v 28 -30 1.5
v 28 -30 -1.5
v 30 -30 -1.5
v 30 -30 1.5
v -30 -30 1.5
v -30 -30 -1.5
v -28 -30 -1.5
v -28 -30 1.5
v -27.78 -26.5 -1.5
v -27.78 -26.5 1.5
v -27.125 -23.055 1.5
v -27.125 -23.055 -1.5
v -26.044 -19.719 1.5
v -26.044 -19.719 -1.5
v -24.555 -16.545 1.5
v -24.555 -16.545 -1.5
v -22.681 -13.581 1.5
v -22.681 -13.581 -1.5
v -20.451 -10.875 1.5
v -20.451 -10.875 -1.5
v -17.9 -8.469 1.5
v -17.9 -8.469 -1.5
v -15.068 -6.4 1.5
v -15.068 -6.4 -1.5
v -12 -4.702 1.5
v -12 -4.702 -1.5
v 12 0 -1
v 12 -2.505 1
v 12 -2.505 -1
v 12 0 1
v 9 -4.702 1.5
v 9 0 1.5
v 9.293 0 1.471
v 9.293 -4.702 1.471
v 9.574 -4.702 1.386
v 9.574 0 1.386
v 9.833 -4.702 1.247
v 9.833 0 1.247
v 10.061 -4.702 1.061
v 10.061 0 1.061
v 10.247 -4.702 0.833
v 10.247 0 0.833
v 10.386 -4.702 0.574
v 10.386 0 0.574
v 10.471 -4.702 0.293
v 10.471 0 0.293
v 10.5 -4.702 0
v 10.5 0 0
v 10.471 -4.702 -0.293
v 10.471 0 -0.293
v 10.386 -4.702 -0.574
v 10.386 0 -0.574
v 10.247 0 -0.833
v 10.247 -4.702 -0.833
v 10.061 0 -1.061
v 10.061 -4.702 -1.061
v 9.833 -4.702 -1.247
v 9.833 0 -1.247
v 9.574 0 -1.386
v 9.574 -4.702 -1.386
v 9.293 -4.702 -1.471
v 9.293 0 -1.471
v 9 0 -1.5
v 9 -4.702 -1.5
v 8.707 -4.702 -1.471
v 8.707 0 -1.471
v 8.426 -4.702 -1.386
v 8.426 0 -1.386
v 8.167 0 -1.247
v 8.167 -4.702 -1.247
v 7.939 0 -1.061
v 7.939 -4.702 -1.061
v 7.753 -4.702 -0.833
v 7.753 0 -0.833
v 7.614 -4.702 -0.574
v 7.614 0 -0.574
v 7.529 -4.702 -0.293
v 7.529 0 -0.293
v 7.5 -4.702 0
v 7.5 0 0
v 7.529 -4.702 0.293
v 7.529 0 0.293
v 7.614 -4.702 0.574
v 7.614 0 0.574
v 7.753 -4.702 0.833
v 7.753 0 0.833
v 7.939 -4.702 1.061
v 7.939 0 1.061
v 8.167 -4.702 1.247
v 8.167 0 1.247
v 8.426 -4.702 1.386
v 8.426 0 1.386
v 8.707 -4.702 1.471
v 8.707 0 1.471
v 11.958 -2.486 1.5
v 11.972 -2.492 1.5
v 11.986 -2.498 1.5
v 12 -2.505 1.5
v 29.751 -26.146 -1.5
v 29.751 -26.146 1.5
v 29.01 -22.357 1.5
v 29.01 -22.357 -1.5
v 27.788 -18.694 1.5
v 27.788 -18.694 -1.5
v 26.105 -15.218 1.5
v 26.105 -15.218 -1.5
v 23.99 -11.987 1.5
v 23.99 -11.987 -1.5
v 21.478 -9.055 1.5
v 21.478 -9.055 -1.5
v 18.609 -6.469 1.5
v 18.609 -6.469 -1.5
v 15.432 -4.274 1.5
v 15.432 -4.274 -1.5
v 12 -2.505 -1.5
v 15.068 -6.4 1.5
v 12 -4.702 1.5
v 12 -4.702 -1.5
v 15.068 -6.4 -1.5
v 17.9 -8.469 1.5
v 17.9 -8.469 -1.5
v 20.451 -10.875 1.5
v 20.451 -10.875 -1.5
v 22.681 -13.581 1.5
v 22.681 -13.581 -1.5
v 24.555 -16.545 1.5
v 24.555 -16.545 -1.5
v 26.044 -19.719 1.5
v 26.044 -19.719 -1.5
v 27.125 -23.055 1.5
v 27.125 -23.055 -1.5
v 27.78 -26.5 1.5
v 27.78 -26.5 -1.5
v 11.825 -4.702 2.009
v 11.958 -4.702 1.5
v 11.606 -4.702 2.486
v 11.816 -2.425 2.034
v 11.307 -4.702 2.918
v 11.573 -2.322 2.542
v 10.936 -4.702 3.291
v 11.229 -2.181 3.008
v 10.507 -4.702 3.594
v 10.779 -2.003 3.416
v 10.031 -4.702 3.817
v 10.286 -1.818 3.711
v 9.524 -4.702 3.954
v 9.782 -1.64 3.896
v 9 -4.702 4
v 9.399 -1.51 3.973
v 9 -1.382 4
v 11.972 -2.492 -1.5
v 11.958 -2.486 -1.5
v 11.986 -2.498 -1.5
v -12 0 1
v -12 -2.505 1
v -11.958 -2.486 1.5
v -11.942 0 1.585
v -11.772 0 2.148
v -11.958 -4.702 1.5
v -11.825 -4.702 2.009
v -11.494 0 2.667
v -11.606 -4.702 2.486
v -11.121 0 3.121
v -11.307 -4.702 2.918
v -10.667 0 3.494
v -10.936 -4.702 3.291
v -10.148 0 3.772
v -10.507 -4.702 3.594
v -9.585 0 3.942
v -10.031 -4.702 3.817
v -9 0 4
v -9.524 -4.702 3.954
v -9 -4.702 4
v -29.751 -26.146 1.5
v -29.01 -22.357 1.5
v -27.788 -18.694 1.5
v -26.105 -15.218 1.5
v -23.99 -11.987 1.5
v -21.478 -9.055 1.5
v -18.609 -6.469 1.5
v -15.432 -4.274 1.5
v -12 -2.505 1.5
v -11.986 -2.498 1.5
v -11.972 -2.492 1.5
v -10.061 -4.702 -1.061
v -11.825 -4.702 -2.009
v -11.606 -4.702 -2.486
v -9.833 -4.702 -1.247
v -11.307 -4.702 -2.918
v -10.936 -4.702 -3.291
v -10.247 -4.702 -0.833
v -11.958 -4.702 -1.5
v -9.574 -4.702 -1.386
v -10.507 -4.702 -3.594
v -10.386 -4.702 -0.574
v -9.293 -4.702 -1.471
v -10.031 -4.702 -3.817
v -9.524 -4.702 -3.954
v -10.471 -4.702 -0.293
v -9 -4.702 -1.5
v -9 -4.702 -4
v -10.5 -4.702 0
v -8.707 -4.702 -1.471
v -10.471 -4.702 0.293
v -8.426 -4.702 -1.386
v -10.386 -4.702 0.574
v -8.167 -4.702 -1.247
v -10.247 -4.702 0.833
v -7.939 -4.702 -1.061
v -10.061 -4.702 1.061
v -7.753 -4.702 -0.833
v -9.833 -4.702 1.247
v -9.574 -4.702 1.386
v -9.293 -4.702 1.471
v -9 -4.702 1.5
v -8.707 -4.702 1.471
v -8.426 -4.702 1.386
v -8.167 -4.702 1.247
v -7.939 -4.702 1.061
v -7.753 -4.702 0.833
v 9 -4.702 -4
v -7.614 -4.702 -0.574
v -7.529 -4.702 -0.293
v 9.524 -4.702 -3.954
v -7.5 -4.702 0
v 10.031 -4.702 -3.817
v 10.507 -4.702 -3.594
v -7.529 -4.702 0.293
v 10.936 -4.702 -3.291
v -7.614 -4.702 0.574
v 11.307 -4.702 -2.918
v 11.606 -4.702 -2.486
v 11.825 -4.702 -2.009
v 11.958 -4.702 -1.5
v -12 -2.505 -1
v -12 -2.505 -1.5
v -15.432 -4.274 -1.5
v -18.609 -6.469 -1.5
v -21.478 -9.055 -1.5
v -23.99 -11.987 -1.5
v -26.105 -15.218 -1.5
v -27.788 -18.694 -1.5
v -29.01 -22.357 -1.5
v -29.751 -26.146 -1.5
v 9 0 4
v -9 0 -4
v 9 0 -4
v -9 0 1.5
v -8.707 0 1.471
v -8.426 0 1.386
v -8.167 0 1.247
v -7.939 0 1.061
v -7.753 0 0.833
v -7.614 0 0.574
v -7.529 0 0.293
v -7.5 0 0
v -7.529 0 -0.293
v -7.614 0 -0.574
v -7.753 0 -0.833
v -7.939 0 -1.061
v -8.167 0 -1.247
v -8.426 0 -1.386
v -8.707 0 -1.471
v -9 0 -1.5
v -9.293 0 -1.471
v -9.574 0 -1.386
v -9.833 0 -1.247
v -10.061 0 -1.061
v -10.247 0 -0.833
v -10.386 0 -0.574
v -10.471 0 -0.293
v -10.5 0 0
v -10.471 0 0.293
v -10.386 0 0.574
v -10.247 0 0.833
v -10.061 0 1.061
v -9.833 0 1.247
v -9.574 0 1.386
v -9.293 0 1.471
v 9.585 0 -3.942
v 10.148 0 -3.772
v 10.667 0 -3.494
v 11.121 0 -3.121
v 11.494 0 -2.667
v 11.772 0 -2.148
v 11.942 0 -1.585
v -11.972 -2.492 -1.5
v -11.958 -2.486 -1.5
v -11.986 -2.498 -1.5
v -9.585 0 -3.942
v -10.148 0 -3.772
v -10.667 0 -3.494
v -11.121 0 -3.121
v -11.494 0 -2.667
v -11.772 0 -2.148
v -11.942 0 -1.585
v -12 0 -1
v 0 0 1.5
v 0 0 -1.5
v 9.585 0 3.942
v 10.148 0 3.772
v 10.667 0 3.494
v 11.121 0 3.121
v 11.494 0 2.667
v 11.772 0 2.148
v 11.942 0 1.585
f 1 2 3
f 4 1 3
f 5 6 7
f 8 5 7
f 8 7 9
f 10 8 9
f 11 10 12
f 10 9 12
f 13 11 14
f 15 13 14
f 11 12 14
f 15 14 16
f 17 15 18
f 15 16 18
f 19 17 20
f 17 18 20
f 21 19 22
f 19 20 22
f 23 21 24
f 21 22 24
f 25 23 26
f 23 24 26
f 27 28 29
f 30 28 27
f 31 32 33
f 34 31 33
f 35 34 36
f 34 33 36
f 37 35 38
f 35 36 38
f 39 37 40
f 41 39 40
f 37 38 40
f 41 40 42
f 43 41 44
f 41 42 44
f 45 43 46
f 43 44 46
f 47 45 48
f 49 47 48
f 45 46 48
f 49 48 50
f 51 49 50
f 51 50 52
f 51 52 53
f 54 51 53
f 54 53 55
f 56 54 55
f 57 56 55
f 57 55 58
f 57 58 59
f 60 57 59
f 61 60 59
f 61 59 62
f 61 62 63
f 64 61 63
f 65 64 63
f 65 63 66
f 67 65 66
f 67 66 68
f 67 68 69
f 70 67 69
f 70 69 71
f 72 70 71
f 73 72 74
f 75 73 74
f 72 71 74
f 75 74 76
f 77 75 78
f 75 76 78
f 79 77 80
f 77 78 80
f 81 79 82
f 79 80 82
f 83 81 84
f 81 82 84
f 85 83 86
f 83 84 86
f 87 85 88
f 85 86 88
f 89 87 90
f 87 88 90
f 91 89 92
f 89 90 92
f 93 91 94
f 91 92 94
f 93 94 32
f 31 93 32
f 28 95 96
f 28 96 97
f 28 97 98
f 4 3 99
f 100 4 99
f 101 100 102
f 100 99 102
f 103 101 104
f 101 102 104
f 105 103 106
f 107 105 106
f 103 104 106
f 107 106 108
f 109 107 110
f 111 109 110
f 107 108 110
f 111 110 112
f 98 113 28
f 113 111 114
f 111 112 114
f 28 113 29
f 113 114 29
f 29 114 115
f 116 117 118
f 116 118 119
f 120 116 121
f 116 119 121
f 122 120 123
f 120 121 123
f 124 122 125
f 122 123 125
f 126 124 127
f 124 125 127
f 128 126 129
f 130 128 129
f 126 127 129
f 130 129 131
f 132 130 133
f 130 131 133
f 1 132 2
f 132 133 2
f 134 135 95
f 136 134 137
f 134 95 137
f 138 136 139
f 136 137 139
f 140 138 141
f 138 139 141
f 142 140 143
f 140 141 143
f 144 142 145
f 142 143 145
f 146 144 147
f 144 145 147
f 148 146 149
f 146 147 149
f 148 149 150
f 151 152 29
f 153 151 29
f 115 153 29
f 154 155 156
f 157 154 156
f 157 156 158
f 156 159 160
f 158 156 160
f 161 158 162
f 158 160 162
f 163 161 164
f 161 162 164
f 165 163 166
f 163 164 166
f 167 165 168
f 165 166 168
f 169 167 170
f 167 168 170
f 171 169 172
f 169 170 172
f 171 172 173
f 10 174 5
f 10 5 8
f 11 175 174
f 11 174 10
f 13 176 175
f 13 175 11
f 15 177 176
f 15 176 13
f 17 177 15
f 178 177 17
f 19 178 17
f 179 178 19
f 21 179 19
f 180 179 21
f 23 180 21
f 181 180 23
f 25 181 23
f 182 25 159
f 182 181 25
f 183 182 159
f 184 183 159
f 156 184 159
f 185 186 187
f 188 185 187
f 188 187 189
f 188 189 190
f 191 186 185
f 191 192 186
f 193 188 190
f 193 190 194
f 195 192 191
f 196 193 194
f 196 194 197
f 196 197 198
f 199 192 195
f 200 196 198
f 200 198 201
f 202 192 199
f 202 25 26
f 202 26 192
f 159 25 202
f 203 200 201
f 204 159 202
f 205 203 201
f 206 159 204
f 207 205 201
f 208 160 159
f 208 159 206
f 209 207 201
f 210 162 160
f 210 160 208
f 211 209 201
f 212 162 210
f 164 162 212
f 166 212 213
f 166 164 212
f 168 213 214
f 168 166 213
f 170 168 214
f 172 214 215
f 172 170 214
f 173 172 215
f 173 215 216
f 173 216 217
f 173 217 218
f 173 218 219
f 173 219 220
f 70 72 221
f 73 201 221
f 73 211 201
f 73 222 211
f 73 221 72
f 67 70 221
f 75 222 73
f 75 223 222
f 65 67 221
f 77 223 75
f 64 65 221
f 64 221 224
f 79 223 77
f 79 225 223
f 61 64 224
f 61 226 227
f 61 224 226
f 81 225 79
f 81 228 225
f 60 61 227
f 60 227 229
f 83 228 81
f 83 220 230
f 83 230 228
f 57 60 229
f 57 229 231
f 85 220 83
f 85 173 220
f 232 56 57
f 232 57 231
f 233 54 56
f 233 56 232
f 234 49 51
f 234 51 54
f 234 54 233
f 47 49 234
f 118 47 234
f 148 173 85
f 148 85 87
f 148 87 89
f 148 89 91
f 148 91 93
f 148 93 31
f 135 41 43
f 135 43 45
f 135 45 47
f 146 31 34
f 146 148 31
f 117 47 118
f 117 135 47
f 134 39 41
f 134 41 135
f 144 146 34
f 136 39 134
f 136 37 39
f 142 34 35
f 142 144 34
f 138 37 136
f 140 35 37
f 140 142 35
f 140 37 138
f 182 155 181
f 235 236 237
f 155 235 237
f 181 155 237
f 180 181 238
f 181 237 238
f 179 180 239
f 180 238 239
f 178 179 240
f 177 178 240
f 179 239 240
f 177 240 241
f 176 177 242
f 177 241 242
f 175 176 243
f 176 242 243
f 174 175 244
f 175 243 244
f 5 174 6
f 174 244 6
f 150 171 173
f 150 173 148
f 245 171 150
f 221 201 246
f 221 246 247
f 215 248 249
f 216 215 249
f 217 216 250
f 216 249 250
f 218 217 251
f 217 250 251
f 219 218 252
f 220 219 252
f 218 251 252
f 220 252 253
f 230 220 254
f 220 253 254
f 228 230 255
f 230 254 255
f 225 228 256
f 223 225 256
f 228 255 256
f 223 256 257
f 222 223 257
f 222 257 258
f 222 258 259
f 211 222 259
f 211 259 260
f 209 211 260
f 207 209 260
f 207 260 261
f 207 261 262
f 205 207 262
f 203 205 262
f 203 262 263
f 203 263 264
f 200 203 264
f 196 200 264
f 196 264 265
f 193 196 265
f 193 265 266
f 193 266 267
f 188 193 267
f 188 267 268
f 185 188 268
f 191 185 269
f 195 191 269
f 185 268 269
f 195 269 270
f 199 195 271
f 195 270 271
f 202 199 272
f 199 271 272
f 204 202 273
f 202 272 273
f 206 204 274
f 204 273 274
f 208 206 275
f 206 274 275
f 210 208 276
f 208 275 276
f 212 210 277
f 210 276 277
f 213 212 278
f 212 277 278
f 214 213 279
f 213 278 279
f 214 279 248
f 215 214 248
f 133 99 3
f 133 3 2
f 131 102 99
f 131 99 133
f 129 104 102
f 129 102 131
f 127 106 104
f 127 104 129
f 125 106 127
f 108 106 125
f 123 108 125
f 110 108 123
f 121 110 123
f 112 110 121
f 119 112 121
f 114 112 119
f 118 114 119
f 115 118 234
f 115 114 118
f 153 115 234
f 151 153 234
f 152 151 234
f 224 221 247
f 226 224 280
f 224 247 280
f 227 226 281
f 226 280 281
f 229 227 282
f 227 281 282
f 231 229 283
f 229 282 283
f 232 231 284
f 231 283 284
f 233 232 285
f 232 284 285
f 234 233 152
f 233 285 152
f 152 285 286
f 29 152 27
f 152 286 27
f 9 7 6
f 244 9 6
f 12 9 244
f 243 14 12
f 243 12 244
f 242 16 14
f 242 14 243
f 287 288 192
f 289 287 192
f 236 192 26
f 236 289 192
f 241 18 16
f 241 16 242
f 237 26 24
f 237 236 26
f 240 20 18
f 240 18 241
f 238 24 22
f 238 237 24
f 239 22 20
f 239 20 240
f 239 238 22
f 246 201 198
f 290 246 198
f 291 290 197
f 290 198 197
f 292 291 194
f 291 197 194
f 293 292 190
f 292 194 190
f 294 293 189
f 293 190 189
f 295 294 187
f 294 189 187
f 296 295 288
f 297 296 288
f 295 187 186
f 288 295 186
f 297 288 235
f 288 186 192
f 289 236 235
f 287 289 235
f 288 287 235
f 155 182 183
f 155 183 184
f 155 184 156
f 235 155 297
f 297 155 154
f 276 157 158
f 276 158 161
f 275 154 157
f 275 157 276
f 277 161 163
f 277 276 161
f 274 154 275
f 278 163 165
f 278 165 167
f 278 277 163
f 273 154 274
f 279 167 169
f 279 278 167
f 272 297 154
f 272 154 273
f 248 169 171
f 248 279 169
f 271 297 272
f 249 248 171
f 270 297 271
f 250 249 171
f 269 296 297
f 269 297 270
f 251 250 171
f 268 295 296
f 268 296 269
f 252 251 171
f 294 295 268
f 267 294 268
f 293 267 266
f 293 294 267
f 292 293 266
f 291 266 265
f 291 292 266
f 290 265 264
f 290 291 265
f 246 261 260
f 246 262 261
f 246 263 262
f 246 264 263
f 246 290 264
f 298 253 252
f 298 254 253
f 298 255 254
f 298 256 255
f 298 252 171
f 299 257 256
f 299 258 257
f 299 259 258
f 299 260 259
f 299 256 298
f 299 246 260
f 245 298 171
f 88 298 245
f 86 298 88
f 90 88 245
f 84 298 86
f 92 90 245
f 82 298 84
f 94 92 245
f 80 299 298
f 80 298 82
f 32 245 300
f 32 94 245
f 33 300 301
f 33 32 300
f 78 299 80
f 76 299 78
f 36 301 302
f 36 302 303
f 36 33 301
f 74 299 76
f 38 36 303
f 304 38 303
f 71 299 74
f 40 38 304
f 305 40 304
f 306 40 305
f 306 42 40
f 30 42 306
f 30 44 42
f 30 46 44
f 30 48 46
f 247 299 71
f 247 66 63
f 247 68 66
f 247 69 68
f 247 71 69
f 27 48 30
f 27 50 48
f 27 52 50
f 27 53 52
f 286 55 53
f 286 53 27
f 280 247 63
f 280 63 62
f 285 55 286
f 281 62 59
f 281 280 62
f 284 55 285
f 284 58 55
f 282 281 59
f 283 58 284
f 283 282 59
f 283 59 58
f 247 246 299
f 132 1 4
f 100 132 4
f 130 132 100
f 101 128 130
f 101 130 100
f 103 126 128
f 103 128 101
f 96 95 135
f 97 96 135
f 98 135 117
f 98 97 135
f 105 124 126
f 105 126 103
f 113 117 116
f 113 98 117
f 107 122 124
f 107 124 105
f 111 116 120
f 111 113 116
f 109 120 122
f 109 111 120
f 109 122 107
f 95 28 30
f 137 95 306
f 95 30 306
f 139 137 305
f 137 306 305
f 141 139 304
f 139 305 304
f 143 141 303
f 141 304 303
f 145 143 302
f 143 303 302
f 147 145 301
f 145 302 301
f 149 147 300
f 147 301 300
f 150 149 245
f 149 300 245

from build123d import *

# Parameters (mm, degrees)
SKETCH_2_W           = 24
SKETCH_2_H           = 8
EXTRUDE_1_DEPTH      = 1
EXTRUDE_3_DEPTH      = 1.5
EXTRUDE_3_DEPTH_BACK = 1.5
EXTRUDE_5_REACH      = 45.174
SKETCH_7_W           = 24
SKETCH_7_H           = 4.701778719
SKETCH_3_R           = 1.5
CUT_EXTRUDE_1_DEPTH  = 43.614551505
FILLET_1_R           = 3


with BuildPart() as part:
    # 草图2 → 凸台-拉伸1 (new body)
    with BuildSketch(Plane(origin=(0, 0, 0), x_dir=(1, 0, 0), z_dir=(0, 1, 0))):
        Rectangle(SKETCH_2_W, SKETCH_2_H)
    extrude(amount=-EXTRUDE_1_DEPTH)

    # 凸台-拉伸5: up to this face of the body (flat: up to its plane)
    extrude_5_end = Plane(part.part.faces().sort_by_distance((0, -0.5, -4))[0])
    # 草图7 → 凸台-拉伸5 (add, up to the picked face)
    with BuildSketch(Plane.XY.offset(4), mode=Mode.PRIVATE) as extrude_5_sk1:
        with Locations((0, -2.350889359)):
            Rectangle(SKETCH_7_W, SKETCH_7_H)
    extrude_5_tool1 = split(extrude(extrude_5_sk1.sketch, amount=-EXTRUDE_5_REACH, mode=Mode.PRIVATE), bisect_by=extrude_5_end, keep=Keep.BOTH, mode=Mode.PRIVATE)


with BuildPart() as body_2:
    # 草图5 → 凸台-拉伸3 (new, two sides: drawn at the far end of the back side and taken through both)
    with BuildSketch(Plane.XY.offset(-EXTRUDE_3_DEPTH_BACK)):
        with BuildLine():
            ThreePointArc((30, -30), (21.213203436, -8.786796564), (0, 0))
            Line((0, 0), (0, -2))
            ThreePointArc((0, -2), (19.798989873, -10.201010127), (28, -30))
            Line((28, -30), (30, -30))
        make_face()
        with BuildLine():
            Line((0, -2), (0, 0))
            ThreePointArc((0, 0), (-21.213203436, -8.786796564), (-30, -30))
            Line((-30, -30), (-28, -30))
            ThreePointArc((-28, -30), (-19.798989873, -10.201010127), (0, -2))
        make_face()
    extrude(amount=EXTRUDE_3_DEPTH + EXTRUDE_3_DEPTH_BACK)


with BuildPart() as part_1:
    add(part.part)

    add(body_2.part)  # 凸台-拉伸5 merges body 2
    add(extrude_5_tool1.solids().sort_by(Axis((0, -2.350889, 4), (0, 0, -1)))[0])

    # 草图3 → 切除-拉伸1 (cut, through all)
    with BuildSketch(Plane(origin=(0, 0, 0), x_dir=(1, 0, 0), z_dir=(0, 1, 0))):
        with Locations(Location((-9, 0, 0), (0, 0, 270))):
            Circle(SKETCH_3_R)
        with Locations(Location((9, 0, 0), (0, 0, 270))):
            Circle(SKETCH_3_R)
    extrude(amount=-CUT_EXTRUDE_1_DEPTH, mode=Mode.SUBTRACT)

    # 圆角1
    # the kernel refuses this fillet: 3 mm, written as the material it takes off along each edge
    with BuildSketch(Plane(origin=(-12, -12.201778719, 4), x_dir=(0, 0, -1), z_dir=(0, 1, 0))) as fillet_1_piece_1_section:
        with BuildLine():
            CenterArc((FILLET_1_R, -FILLET_1_R), FILLET_1_R, 90, 90)
            Line((0, -FILLET_1_R), (0, 0))
            Line((0, 0), (FILLET_1_R, 0))
        make_face()
    fillet_1_piece_1 = extrude(amount=19.701778719, mode=Mode.PRIVATE)
    fillet_1_piece_1 = split(fillet_1_piece_1, bisect_by=Plane(origin=(-10.876445005, -4.454369233, 1.5), z_dir=(0, 0, 1)), keep=Keep.TOP, mode=Mode.PRIVATE)
    add(fillet_1_piece_1, mode=Mode.SUBTRACT)
    with BuildSketch(Plane(origin=(-12, -12.201778719, 4), x_dir=(0, 0, -1), z_dir=(0, 1, 0))) as fillet_1_piece_2_section:
        with BuildLine():
            CenterArc((FILLET_1_R, -FILLET_1_R), FILLET_1_R, 90, 90)
            Line((0, -FILLET_1_R), (0, 0))
            Line((0, 0), (FILLET_1_R, 0))
        make_face()
    fillet_1_piece_2 = extrude(amount=19.701778719, mode=Mode.PRIVATE)
    fillet_1_piece_2 = fillet_1_piece_2 - Plane(origin=(0, -30, 1.375084053), x_dir=(1, 0, 0), z_dir=(0, 0, -1)) * Cylinder(30, 52, mode=Mode.PRIVATE)
    add(fillet_1_piece_2, mode=Mode.SUBTRACT)
    with BuildSketch(Plane(origin=(-12, -12.201778719, -4), x_dir=(1, 0, 0), z_dir=(0, 1, 0))) as fillet_1_piece_3_section:
        with BuildLine():
            CenterArc((FILLET_1_R, -FILLET_1_R), FILLET_1_R, 90, 90)
            Line((0, -FILLET_1_R), (0, 0))
            Line((0, 0), (FILLET_1_R, 0))
        make_face()
    fillet_1_piece_3 = extrude(amount=19.701778719, mode=Mode.PRIVATE)
    fillet_1_piece_3 = split(fillet_1_piece_3, bisect_by=Plane(origin=(-10.876427582, -4.45436464, -1.5), z_dir=(0, 0, -1)), keep=Keep.TOP, mode=Mode.PRIVATE)
    add(fillet_1_piece_3, mode=Mode.SUBTRACT)
    with BuildSketch(Plane(origin=(-12, -12.201778719, -4), x_dir=(1, 0, 0), z_dir=(0, 1, 0))) as fillet_1_piece_4_section:
        with BuildLine():
            CenterArc((FILLET_1_R, -FILLET_1_R), FILLET_1_R, 90, 90)
            Line((0, -FILLET_1_R), (0, 0))
            Line((0, 0), (FILLET_1_R, 0))
        make_face()
    fillet_1_piece_4 = extrude(amount=19.701778719, mode=Mode.PRIVATE)
    fillet_1_piece_4 = fillet_1_piece_4 - Plane(origin=(0, -30, -1.375084091), x_dir=(1, 0, 0), z_dir=(0, 0, -1)) * Cylinder(30, 52, mode=Mode.PRIVATE)
    add(fillet_1_piece_4, mode=Mode.SUBTRACT)
    with BuildSketch(Plane(origin=(12, 7.5, 4), x_dir=(0, 0, -1), z_dir=(0, -1, 0))) as fillet_1_piece_5_section:
        with BuildLine():
            CenterArc((FILLET_1_R, -FILLET_1_R), FILLET_1_R, 90, 90)
            Line((0, -FILLET_1_R), (0, 0))
            Line((0, 0), (FILLET_1_R, 0))
        make_face()
    fillet_1_piece_5 = extrude(amount=19.701778719, mode=Mode.PRIVATE)
    fillet_1_piece_5 = fillet_1_piece_5 - Plane(origin=(0, -30, 1.375084091), x_dir=(1, 0, 0), z_dir=(0, 0, -1)) * Cylinder(30, 52, mode=Mode.PRIVATE)
    add(fillet_1_piece_5, mode=Mode.SUBTRACT)
    with BuildSketch(Plane(origin=(12, 7.5, 4), x_dir=(0, 0, -1), z_dir=(0, -1, 0))) as fillet_1_piece_6_section:
        with BuildLine():
            CenterArc((FILLET_1_R, -FILLET_1_R), FILLET_1_R, 90, 90)
            Line((0, -FILLET_1_R), (0, 0))
            Line((0, 0), (FILLET_1_R, 0))
        make_face()
    fillet_1_piece_6 = extrude(amount=19.701778719, mode=Mode.PRIVATE)
    fillet_1_piece_6 = split(fillet_1_piece_6, bisect_by=Plane(origin=(11.332354587, -3.316124118, 1.5), z_dir=(0, 0, 1)), keep=Keep.TOP, mode=Mode.PRIVATE)
    add(fillet_1_piece_6, mode=Mode.SUBTRACT)
    with BuildSketch(Plane(origin=(12, 7.5, -4), x_dir=(-1, 0, 0), z_dir=(0, -1, 0))) as fillet_1_piece_7_section:
        with BuildLine():
            CenterArc((FILLET_1_R, -FILLET_1_R), FILLET_1_R, 90, 90)
            Line((0, -FILLET_1_R), (0, 0))
            Line((0, 0), (FILLET_1_R, 0))
        make_face()
    fillet_1_piece_7 = extrude(amount=19.701778719, mode=Mode.PRIVATE)
    fillet_1_piece_7 = split(fillet_1_piece_7, bisect_by=Plane(origin=(11.383708583, -1.124807359, -1.5), z_dir=(0, 0, -1)), keep=Keep.TOP, mode=Mode.PRIVATE)
    add(fillet_1_piece_7, mode=Mode.SUBTRACT)
    with BuildSketch(Plane(origin=(12, 7.5, -4), x_dir=(-1, 0, 0), z_dir=(0, -1, 0))) as fillet_1_piece_8_section:
        with BuildLine():
            CenterArc((FILLET_1_R, -FILLET_1_R), FILLET_1_R, 90, 90)
            Line((0, -FILLET_1_R), (0, 0))
            Line((0, 0), (FILLET_1_R, 0))
        make_face()
    fillet_1_piece_8 = extrude(amount=19.701778719, mode=Mode.PRIVATE)
    fillet_1_piece_8 = fillet_1_piece_8 - Plane(origin=(0, -30, -1.375084091), x_dir=(1, 0, 0), z_dir=(0, 0, -1)) * Cylinder(30, 52, mode=Mode.PRIVATE)
    add(fillet_1_piece_8, mode=Mode.SUBTRACT)


solid = part_1.part
